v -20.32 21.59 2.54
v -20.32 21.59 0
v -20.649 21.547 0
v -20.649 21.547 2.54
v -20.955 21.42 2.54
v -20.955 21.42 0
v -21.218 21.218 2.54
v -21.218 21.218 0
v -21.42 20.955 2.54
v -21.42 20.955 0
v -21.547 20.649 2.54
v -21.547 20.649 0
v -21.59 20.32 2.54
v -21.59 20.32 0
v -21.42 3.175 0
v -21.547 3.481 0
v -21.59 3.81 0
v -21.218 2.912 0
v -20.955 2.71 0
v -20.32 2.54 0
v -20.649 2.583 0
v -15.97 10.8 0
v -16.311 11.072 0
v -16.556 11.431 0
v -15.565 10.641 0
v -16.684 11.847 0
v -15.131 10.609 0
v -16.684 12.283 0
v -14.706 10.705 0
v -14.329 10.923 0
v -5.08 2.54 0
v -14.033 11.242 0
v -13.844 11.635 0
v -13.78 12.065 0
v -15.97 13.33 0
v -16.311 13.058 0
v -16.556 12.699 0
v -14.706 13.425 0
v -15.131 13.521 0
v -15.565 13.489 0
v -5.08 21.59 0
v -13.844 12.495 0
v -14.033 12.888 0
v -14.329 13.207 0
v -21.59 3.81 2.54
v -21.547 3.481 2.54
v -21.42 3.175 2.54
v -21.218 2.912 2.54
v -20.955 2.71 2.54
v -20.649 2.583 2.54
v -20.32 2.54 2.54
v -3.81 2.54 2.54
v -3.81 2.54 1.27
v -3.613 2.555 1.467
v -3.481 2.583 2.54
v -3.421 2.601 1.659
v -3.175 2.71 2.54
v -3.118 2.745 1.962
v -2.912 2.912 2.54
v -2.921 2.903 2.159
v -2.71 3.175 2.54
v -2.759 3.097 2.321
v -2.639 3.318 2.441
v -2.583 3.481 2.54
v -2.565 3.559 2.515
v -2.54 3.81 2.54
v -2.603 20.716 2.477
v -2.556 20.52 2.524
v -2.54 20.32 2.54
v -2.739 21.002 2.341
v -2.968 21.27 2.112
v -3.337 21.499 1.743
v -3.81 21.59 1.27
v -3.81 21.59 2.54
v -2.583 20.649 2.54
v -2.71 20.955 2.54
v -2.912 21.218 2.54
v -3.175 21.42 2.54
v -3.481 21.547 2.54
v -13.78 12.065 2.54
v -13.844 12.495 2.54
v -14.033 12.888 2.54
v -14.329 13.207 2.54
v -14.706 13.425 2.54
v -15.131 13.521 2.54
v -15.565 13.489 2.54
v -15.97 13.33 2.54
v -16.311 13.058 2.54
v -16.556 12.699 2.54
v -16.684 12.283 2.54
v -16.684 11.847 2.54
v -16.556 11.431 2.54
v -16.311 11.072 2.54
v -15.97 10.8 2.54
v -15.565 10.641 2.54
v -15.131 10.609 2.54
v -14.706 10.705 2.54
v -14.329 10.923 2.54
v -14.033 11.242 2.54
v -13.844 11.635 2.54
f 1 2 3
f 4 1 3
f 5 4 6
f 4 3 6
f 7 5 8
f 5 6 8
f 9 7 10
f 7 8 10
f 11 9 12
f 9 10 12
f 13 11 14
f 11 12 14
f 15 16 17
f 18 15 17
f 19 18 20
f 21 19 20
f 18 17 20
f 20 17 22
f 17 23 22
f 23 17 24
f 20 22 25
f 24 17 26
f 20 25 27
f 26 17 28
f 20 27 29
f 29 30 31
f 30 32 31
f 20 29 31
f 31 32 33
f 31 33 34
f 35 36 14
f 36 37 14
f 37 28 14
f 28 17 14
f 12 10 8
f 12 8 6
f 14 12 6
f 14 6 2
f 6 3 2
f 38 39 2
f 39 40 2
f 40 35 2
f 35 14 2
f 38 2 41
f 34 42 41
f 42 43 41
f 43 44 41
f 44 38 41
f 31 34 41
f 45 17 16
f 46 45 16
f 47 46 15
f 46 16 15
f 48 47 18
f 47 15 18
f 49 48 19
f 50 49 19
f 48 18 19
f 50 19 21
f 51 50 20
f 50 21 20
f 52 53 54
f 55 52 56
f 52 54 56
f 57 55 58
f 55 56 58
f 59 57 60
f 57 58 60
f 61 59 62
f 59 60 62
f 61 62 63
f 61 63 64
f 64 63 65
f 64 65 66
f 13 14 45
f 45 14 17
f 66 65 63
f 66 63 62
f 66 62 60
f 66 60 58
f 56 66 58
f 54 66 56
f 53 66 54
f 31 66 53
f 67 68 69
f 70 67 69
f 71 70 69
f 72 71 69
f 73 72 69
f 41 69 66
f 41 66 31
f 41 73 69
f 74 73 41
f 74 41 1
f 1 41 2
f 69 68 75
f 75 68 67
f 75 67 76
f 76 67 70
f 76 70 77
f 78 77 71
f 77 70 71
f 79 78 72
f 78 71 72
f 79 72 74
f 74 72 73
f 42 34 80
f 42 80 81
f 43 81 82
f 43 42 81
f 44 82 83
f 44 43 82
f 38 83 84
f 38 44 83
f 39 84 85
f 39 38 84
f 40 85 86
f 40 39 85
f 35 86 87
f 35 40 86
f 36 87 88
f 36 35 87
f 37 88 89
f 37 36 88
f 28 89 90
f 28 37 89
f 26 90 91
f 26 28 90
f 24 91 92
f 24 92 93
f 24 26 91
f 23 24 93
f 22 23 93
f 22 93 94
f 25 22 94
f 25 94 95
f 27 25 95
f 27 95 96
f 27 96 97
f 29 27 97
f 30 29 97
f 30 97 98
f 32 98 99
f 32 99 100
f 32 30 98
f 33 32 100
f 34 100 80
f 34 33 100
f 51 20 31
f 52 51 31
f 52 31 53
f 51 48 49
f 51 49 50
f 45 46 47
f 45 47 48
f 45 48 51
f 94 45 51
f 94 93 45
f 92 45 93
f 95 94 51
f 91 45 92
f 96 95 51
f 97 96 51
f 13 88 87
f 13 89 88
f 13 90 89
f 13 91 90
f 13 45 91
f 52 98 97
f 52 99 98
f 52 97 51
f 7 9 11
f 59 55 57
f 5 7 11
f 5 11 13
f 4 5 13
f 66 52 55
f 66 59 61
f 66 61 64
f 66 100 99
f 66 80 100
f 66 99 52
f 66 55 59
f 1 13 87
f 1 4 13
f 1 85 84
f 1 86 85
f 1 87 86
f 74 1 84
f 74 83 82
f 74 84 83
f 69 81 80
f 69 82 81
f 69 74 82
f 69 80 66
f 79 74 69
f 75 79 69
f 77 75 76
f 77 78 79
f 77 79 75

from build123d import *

# Parameters (mm, degrees)
F0_R        = 1.4605
F1_DEPTH    = 2.54
F2_T1_DEPTH = 29.5741495789


# Not quite as in the source:
# - a fillet or chamfer that OpenCascade refuses, or shapes differently, is made with other operations: its cross-section is extruded or revolved along the edge and cut away or added
# - a feature names something its author has since deleted; it is built from what else it names


with BuildPart() as f1:
    # F0 (on Top) → F1 (new body)
    with BuildSketch(Plane.XY):
        with BuildLine():
            Line((-20.32, 2.54), (-3.81, 2.54))
            ThreePointArc((-3.81, 2.54), (-2.9119743879, 2.9119743879), (-2.54, 3.81))
            Line((-2.54, 3.81), (-2.54, 20.32))
            ThreePointArc((-2.54, 20.32), (-2.9119743879, 21.2180256121), (-3.81, 21.59))
            Line((-3.81, 21.59), (-20.32, 21.59))
            ThreePointArc((-20.32, 21.59), (-21.2180256121, 21.2180256121), (-21.59, 20.32))
            Line((-21.59, 20.32), (-21.59, 3.81))
            ThreePointArc((-21.59, 3.81), (-21.2180256121, 2.9119743879), (-20.32, 2.54))
        make_face()
        with Locations((-15.24, 12.065)):
            Circle(F0_R, mode=Mode.SUBTRACT)
    extrude(amount=F1_DEPTH)

    # F2: chamfer of 2.54 on 1 edges, made by hand

    # F2_s2 → F2_t1 (cut)
    with BuildSketch(Plane.XZ.offset(-26.8520747894)):
        Polygon((-2.54, 2.54), (-5.08, 0), (-2.54, 0), align=None)
    extrude(amount=F2_T1_DEPTH, mode=Mode.SUBTRACT)


solid = f1.part
